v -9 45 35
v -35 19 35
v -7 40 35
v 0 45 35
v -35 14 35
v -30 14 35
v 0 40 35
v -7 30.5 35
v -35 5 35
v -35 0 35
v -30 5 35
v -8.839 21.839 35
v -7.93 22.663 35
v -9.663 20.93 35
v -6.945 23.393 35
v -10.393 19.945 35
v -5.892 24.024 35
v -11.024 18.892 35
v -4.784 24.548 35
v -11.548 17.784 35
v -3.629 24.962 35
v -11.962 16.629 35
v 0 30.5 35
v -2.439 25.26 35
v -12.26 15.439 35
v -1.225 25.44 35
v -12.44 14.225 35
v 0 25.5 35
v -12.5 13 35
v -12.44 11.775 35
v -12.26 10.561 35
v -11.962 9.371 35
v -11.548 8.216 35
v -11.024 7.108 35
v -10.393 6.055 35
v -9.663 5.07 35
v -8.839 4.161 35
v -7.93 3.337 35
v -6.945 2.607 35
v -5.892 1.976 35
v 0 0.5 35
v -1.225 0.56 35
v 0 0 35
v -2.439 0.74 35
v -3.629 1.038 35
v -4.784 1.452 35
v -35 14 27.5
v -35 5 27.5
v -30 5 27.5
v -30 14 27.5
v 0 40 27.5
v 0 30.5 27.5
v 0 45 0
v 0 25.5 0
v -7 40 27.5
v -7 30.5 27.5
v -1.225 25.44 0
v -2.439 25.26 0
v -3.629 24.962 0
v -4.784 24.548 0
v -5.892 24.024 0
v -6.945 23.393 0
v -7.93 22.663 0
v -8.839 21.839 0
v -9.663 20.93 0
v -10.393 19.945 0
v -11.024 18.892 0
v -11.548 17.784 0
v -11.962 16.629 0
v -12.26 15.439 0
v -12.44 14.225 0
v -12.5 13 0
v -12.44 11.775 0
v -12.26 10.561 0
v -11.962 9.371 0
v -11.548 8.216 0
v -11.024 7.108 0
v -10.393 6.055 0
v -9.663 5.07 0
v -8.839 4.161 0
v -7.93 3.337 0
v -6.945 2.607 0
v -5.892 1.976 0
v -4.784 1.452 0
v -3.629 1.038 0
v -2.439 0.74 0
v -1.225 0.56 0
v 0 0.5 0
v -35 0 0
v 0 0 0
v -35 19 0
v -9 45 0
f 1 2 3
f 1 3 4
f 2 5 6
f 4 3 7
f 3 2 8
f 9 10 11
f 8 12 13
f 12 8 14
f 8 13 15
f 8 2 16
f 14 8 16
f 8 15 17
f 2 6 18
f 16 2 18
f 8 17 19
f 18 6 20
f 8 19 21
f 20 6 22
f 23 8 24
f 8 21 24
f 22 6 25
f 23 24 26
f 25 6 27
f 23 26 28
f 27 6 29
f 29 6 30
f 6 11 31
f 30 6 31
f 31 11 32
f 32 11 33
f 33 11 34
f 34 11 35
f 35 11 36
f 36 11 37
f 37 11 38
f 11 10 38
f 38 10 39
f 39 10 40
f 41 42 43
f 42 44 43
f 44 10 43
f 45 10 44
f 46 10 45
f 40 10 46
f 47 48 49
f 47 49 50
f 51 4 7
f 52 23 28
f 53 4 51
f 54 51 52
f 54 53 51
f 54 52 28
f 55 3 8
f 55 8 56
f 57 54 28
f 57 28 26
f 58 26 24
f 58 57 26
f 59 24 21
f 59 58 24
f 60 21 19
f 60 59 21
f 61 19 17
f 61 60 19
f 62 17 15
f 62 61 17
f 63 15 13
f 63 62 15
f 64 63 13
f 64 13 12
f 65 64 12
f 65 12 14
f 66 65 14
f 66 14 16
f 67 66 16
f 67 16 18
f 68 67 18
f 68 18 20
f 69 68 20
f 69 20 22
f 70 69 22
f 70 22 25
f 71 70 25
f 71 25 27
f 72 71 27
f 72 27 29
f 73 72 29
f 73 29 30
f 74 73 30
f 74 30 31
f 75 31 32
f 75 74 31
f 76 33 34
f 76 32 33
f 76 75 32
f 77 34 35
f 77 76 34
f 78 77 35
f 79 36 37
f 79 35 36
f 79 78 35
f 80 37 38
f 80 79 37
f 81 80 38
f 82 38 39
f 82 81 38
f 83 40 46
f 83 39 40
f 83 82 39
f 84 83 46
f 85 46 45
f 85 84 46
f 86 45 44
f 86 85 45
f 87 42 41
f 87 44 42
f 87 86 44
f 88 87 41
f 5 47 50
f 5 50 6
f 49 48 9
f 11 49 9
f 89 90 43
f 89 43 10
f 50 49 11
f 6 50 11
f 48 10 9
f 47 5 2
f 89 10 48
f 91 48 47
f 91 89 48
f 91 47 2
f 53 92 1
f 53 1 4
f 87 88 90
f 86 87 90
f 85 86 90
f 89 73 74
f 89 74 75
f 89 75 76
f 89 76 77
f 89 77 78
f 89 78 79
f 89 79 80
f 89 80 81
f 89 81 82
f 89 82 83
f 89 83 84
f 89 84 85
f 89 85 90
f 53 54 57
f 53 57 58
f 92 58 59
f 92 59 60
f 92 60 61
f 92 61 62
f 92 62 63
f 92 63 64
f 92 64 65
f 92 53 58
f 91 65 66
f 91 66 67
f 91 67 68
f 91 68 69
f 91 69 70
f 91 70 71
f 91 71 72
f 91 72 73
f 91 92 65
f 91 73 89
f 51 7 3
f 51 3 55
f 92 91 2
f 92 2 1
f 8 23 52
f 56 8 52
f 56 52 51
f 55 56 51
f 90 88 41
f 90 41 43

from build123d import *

# Parameters (mm, degrees)
BOSS_EXTRUDE1_DEPTH = 150
SKETCH3_W           = 35
SKETCH3_H           = 80
CUT_EXTRUDE1_DEPTH  = 150
SKETCH5_W           = 7.5
SKETCH5_H           = 9.5
CUT_EXTRUDE3_DEPTH  = 7
SKETCH6_W           = 7.5
SKETCH6_H           = 9
CUT_EXTRUDE4_DEPTH  = 5
SKETCH7_W           = 66.039270253
SKETCH7_H           = 79.533085961
CUT_EXTRUDE5_DEPTH  = 70


with BuildPart() as part:
    # Sketch2 → Boss-Extrude1 (new body)
    with BuildSketch(Plane.XY):
        with BuildLine():
            Line((0, 0), (-35, 0))
            Line((-35, 0), (-35, 19))
            Line((-35, 19), (-9, 45))
            Line((-9, 45), (0, 45))
            Line((0, 45), (0, 25.5))
            ThreePointArc((0, 25.5), (-12.5, 13), (0, 0.5))
            Line((0, 0.5), (0, 0))
        make_face()
    extrude(amount=BOSS_EXTRUDE1_DEPTH)

    # Sketch3 → Cut-Extrude1 (cut)
    with BuildSketch(Plane.XZ):
        with Locations((-17.5, 75)):
            Rectangle(SKETCH3_W, SKETCH3_H)
    extrude(amount=-CUT_EXTRUDE1_DEPTH, mode=Mode.SUBTRACT)


with BuildPart() as cut_extrude1_piece_1:
    # of the separate pieces the step leaves, piece 1, a body of its own (cut_extrude1_pieces)
    add(part.part.solids().sort_by_distance((0, 0.5, 115))[0])


with BuildPart() as cut_extrude1_piece_2:
    # of the separate pieces the step leaves, piece 2, a body of its own (cut_extrude1_pieces)
    add(part.part.solids().sort_by_distance((0, 25.5, 0))[0])


with BuildPart() as cut_extrude3_tool:
    # Sketch5 → Cut-Extrude3 (new body)
    with BuildSketch(Plane(origin=(0, 0, 0), x_dir=(0, 0, -1), z_dir=(1, 0, 0))):
        with Locations((-118.75, 35.25)):
            Rectangle(SKETCH5_W, SKETCH5_H)
        with Locations((-31.25, 35.25)):
            Rectangle(SKETCH5_W, SKETCH5_H)
    extrude(amount=-CUT_EXTRUDE3_DEPTH)


with BuildPart() as cut_extrude1_piece_1_1:
    add(cut_extrude1_piece_1.part)

    # Cut-Extrude3: cut by cut_extrude3_tool
    add(cut_extrude3_tool.part, mode=Mode.SUBTRACT)


with BuildPart() as cut_extrude1_piece_2_1:
    add(cut_extrude1_piece_2.part)

    # Cut-Extrude3: cut by cut_extrude3_tool
    add(cut_extrude3_tool.part, mode=Mode.SUBTRACT)


with BuildPart() as cut_extrude4_tool:
    # Sketch6 → Cut-Extrude4 (new body)
    with BuildSketch(Plane.ZY.offset(35)):
        with Locations((31.25, 9.5)):
            Rectangle(SKETCH6_W, SKETCH6_H)
        with Locations((118.75, 9.5)):
            Rectangle(SKETCH6_W, SKETCH6_H)
    extrude(amount=-CUT_EXTRUDE4_DEPTH)


with BuildPart() as cut_extrude1_piece_1_2:
    add(cut_extrude1_piece_1_1.part)

    # Cut-Extrude4: cut by cut_extrude4_tool
    add(cut_extrude4_tool.part, mode=Mode.SUBTRACT)

    # Sketch7 → Cut-Extrude5 (cut)
    with BuildSketch(Plane.ZY.offset(35)):
        with Locations((129.10930736, 20.534013606)):
            Rectangle(SKETCH7_W, SKETCH7_H)
    extrude(amount=-CUT_EXTRUDE5_DEPTH, mode=Mode.SUBTRACT)


with BuildPart() as cut_extrude1_piece_2_2:
    add(cut_extrude1_piece_2_1.part)

    # Cut-Extrude4: cut by cut_extrude4_tool
    add(cut_extrude4_tool.part, mode=Mode.SUBTRACT)


solid = cut_extrude1_piece_2_2.part
